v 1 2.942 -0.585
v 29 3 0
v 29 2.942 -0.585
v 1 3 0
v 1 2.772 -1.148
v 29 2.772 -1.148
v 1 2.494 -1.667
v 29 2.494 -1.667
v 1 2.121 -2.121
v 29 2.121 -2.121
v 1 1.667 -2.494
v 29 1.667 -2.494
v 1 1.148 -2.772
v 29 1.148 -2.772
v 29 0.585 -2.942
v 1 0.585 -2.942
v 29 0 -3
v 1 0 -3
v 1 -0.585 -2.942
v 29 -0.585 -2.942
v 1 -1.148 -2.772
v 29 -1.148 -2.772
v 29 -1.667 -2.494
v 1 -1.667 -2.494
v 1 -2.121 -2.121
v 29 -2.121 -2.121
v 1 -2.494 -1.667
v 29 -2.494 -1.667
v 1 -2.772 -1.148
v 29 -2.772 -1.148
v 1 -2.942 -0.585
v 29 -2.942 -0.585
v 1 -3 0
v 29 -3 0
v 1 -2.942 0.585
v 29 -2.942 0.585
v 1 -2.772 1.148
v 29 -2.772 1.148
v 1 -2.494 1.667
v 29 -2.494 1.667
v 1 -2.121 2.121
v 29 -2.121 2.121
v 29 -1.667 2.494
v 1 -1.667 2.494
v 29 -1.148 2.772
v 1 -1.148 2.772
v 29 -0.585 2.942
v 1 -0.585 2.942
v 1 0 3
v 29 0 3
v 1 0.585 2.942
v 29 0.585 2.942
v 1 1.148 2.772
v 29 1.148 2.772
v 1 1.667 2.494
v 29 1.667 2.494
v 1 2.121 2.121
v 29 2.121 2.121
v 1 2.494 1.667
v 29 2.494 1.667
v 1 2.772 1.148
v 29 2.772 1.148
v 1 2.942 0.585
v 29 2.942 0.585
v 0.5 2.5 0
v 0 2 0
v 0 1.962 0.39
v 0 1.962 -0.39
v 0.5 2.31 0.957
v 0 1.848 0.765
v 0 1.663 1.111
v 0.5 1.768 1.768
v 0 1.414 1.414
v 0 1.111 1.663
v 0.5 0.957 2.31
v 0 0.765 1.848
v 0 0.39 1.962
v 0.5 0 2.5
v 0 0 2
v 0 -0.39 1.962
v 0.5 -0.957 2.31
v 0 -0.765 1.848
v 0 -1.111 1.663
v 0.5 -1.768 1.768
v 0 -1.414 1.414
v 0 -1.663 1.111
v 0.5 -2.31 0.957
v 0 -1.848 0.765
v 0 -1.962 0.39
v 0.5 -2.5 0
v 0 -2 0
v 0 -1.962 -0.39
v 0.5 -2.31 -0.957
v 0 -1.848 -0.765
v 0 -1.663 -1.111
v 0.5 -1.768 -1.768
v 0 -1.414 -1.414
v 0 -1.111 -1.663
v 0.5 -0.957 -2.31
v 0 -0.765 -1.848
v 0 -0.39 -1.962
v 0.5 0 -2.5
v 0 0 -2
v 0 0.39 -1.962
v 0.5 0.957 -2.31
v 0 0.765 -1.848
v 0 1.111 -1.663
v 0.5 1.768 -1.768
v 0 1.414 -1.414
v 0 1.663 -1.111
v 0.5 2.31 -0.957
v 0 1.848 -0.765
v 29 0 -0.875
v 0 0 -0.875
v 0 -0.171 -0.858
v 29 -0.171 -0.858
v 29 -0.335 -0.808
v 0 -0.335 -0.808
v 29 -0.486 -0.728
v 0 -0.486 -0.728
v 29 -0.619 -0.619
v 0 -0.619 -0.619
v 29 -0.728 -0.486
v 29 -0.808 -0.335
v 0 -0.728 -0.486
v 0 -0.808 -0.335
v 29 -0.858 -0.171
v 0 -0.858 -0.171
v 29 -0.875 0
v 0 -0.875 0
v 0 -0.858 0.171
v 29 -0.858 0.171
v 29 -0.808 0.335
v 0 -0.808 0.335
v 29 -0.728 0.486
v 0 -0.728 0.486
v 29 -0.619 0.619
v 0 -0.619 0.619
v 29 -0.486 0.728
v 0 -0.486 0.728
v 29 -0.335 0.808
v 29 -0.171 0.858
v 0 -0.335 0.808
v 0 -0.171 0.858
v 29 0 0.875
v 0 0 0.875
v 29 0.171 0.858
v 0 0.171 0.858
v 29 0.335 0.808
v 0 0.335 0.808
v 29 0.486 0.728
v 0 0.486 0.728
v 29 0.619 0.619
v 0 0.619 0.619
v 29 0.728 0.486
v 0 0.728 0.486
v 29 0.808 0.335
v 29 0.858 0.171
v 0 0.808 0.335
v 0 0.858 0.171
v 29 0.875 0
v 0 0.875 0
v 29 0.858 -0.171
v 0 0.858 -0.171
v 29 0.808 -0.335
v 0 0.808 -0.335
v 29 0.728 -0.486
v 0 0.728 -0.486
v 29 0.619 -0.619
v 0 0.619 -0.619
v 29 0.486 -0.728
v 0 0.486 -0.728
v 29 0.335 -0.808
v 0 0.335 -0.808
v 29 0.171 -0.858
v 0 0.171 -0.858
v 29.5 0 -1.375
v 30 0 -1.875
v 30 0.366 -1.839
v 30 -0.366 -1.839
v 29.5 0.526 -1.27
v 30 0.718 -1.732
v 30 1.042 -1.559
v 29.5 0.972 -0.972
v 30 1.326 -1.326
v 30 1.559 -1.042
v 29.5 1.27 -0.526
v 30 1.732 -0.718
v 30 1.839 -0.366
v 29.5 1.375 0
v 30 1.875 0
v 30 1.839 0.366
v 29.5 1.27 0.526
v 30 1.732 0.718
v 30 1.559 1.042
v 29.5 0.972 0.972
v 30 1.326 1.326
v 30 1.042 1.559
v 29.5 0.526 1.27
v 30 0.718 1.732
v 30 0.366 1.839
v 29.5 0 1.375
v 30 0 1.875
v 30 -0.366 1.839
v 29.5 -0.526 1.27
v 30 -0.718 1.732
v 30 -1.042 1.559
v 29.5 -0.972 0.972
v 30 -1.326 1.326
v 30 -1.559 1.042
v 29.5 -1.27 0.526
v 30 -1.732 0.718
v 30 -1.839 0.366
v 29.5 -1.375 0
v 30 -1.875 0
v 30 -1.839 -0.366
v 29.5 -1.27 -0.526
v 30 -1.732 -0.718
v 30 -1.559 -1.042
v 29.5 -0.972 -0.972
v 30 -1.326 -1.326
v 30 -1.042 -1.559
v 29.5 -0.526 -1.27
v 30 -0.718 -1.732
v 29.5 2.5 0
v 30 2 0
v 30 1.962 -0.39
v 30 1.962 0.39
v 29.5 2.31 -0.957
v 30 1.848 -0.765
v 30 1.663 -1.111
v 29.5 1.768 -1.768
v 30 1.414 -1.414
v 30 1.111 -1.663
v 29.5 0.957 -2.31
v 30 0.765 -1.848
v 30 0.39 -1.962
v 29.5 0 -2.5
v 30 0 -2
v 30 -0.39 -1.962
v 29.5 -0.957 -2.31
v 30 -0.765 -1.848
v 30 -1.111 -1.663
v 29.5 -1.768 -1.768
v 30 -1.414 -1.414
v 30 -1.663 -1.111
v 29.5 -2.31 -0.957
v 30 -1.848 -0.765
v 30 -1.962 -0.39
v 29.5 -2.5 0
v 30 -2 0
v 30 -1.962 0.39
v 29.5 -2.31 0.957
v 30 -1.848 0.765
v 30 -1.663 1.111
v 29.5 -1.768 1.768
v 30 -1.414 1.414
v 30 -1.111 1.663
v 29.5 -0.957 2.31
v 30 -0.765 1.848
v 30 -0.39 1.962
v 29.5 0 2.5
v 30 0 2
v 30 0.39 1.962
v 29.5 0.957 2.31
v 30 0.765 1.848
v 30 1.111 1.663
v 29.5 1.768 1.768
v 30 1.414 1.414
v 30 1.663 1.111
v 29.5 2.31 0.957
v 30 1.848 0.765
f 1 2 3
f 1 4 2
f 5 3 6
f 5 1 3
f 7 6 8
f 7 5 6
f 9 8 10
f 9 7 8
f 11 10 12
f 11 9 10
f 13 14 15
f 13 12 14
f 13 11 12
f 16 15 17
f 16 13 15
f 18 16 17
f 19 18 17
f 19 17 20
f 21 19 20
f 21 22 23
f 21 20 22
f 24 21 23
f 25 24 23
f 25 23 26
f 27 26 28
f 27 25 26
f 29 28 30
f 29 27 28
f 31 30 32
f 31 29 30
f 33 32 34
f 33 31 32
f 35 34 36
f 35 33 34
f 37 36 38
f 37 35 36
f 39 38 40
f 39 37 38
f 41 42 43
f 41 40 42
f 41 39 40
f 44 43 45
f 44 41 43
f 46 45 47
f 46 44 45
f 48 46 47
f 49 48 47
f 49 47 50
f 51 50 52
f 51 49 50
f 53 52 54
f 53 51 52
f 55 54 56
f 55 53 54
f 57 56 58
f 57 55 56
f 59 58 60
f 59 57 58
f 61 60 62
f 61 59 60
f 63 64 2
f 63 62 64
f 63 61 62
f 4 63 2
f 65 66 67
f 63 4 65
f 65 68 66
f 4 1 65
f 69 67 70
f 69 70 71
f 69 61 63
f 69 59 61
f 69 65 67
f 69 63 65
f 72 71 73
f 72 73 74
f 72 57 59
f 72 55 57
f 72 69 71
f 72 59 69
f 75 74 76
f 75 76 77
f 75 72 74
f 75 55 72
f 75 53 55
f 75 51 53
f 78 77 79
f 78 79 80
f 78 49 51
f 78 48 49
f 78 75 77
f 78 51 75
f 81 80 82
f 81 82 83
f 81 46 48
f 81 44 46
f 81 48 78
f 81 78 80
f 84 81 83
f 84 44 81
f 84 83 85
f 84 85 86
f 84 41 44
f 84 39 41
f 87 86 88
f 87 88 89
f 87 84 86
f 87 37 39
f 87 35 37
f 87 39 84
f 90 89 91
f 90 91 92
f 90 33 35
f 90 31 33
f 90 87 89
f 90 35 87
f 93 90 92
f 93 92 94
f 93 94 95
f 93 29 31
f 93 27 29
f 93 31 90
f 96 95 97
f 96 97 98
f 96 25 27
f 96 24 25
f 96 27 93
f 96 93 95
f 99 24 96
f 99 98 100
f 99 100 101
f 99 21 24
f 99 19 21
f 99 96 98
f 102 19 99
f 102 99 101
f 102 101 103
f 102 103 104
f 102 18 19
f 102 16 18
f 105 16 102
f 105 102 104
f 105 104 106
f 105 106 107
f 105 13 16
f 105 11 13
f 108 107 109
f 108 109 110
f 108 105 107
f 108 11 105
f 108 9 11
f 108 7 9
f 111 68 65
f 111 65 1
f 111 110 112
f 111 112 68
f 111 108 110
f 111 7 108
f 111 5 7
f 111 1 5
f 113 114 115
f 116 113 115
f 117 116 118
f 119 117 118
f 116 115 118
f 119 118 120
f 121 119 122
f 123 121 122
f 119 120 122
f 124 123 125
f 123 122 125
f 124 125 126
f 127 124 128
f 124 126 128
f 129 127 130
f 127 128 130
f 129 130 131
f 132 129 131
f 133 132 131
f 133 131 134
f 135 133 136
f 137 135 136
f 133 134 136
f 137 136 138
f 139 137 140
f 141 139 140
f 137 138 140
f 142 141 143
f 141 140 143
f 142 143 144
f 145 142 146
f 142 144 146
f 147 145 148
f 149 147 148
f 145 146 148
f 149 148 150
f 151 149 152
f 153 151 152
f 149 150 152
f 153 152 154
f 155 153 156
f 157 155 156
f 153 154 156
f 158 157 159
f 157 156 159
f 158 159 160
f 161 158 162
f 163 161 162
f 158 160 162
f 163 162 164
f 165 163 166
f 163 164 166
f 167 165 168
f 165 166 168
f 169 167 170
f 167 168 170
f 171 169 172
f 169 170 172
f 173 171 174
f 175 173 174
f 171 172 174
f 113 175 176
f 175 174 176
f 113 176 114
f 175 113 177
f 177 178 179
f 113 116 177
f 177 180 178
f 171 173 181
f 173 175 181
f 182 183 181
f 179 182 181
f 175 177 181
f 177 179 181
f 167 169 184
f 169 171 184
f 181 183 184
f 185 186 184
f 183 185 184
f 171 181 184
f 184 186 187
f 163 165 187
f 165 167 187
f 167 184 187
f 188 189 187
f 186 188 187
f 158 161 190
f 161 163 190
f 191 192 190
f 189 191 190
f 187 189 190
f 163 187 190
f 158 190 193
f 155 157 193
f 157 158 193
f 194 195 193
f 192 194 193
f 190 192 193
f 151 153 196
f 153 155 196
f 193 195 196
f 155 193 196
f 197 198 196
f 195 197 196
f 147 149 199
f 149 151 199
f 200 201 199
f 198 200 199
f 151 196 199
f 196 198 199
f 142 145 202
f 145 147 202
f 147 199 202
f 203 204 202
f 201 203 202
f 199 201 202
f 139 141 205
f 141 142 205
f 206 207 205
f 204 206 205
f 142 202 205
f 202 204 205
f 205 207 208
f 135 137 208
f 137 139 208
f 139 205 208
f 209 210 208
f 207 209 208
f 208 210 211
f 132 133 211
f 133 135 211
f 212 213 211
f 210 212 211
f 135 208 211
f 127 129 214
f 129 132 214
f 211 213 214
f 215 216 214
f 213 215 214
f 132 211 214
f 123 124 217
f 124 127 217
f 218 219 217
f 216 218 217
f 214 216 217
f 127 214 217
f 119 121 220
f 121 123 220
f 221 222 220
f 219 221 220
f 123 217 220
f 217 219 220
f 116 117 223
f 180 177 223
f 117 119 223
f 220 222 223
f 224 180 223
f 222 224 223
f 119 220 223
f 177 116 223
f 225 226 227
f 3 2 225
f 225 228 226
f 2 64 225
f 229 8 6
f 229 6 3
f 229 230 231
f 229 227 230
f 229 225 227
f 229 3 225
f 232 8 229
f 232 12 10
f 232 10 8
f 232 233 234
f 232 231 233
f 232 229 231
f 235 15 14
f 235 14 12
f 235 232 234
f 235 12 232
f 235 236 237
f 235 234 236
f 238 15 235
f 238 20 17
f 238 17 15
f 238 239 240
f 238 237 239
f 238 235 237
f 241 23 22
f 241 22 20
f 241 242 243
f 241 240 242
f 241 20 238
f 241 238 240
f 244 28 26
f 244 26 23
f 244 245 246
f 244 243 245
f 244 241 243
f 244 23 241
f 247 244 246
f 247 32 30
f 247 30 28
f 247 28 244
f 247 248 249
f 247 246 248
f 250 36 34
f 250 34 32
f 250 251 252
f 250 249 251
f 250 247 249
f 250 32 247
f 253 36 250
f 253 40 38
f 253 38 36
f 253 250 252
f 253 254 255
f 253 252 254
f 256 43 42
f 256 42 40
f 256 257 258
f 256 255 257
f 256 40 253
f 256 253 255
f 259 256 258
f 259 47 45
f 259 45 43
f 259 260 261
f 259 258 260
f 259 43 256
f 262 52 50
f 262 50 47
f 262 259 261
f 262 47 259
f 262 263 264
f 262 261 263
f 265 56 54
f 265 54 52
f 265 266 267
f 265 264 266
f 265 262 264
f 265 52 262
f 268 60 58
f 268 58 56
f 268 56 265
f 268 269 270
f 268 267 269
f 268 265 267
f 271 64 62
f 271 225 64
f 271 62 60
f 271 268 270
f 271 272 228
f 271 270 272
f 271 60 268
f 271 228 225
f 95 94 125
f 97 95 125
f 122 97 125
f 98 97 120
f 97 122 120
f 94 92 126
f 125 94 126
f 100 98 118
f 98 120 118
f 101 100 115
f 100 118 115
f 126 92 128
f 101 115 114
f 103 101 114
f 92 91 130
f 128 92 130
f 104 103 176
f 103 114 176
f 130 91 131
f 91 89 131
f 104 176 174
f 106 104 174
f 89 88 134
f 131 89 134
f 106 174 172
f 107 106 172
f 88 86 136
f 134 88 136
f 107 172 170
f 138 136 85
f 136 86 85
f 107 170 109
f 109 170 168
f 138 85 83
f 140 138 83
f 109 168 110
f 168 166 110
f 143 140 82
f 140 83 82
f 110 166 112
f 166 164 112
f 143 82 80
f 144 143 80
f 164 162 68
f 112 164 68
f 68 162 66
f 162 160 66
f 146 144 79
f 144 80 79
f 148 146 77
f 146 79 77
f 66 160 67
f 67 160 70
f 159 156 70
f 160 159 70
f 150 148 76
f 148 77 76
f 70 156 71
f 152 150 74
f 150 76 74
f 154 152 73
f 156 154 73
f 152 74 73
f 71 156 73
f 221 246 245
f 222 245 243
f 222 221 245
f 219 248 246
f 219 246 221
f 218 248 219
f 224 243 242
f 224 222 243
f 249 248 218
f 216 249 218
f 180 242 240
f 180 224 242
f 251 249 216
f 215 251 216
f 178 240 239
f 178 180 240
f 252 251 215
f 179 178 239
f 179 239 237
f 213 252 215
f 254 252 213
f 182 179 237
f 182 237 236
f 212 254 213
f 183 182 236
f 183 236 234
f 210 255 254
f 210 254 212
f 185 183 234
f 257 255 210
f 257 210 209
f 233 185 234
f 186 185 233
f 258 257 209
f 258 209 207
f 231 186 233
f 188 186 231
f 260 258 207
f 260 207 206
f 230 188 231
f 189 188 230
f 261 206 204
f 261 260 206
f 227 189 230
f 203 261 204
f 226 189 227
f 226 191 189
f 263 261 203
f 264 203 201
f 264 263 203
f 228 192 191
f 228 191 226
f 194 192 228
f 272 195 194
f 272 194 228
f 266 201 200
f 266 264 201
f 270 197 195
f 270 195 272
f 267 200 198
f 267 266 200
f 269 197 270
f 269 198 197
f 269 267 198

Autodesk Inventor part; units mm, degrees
ref_plane "YZ Plane" through (0, 0, 0) normal (1, 0, 0) x (0, 1, 0)
ref_plane "XZ Plane" through (0, 0, 0) normal (0, 1, 0) x (-1, 0, 0)
ref_plane "XY Plane" through (0, 0, 0) normal (0, 0, 1) x (1, 0, 0)
sketch "Szkic1" plane through (0, 0, 0) normal (1, 0, 0) x (0, 1, 0)
  circle A0 centre (0, 0) radius 3
  dimension "d0" = 6
extrude "Wyciągnięcie proste1" add sketch "Szkic1" along normal blind 30
sketch "Szkic2" plane through (30, 0, 0) normal (1, 0, 0) x (0, 0, -1)
  point P0 (0, 0)
  point P1 (0, 0)
hole "Otwór1" at (30, 0, 0) direction (-1, 0, 0) diameter 1.75 end through all
thread "Gwint1" size "M6x1" class "6g" standard "ANSI Metric M Profile" full length
chamfer "Faza1" distance 1 angle 45 2 edges at (30, -3, 0) (0, -3, 0)
chamfer "Faza2" distance 1 angle 45 1 edges at (30, 0, 0.875)
properties part number "throat"
